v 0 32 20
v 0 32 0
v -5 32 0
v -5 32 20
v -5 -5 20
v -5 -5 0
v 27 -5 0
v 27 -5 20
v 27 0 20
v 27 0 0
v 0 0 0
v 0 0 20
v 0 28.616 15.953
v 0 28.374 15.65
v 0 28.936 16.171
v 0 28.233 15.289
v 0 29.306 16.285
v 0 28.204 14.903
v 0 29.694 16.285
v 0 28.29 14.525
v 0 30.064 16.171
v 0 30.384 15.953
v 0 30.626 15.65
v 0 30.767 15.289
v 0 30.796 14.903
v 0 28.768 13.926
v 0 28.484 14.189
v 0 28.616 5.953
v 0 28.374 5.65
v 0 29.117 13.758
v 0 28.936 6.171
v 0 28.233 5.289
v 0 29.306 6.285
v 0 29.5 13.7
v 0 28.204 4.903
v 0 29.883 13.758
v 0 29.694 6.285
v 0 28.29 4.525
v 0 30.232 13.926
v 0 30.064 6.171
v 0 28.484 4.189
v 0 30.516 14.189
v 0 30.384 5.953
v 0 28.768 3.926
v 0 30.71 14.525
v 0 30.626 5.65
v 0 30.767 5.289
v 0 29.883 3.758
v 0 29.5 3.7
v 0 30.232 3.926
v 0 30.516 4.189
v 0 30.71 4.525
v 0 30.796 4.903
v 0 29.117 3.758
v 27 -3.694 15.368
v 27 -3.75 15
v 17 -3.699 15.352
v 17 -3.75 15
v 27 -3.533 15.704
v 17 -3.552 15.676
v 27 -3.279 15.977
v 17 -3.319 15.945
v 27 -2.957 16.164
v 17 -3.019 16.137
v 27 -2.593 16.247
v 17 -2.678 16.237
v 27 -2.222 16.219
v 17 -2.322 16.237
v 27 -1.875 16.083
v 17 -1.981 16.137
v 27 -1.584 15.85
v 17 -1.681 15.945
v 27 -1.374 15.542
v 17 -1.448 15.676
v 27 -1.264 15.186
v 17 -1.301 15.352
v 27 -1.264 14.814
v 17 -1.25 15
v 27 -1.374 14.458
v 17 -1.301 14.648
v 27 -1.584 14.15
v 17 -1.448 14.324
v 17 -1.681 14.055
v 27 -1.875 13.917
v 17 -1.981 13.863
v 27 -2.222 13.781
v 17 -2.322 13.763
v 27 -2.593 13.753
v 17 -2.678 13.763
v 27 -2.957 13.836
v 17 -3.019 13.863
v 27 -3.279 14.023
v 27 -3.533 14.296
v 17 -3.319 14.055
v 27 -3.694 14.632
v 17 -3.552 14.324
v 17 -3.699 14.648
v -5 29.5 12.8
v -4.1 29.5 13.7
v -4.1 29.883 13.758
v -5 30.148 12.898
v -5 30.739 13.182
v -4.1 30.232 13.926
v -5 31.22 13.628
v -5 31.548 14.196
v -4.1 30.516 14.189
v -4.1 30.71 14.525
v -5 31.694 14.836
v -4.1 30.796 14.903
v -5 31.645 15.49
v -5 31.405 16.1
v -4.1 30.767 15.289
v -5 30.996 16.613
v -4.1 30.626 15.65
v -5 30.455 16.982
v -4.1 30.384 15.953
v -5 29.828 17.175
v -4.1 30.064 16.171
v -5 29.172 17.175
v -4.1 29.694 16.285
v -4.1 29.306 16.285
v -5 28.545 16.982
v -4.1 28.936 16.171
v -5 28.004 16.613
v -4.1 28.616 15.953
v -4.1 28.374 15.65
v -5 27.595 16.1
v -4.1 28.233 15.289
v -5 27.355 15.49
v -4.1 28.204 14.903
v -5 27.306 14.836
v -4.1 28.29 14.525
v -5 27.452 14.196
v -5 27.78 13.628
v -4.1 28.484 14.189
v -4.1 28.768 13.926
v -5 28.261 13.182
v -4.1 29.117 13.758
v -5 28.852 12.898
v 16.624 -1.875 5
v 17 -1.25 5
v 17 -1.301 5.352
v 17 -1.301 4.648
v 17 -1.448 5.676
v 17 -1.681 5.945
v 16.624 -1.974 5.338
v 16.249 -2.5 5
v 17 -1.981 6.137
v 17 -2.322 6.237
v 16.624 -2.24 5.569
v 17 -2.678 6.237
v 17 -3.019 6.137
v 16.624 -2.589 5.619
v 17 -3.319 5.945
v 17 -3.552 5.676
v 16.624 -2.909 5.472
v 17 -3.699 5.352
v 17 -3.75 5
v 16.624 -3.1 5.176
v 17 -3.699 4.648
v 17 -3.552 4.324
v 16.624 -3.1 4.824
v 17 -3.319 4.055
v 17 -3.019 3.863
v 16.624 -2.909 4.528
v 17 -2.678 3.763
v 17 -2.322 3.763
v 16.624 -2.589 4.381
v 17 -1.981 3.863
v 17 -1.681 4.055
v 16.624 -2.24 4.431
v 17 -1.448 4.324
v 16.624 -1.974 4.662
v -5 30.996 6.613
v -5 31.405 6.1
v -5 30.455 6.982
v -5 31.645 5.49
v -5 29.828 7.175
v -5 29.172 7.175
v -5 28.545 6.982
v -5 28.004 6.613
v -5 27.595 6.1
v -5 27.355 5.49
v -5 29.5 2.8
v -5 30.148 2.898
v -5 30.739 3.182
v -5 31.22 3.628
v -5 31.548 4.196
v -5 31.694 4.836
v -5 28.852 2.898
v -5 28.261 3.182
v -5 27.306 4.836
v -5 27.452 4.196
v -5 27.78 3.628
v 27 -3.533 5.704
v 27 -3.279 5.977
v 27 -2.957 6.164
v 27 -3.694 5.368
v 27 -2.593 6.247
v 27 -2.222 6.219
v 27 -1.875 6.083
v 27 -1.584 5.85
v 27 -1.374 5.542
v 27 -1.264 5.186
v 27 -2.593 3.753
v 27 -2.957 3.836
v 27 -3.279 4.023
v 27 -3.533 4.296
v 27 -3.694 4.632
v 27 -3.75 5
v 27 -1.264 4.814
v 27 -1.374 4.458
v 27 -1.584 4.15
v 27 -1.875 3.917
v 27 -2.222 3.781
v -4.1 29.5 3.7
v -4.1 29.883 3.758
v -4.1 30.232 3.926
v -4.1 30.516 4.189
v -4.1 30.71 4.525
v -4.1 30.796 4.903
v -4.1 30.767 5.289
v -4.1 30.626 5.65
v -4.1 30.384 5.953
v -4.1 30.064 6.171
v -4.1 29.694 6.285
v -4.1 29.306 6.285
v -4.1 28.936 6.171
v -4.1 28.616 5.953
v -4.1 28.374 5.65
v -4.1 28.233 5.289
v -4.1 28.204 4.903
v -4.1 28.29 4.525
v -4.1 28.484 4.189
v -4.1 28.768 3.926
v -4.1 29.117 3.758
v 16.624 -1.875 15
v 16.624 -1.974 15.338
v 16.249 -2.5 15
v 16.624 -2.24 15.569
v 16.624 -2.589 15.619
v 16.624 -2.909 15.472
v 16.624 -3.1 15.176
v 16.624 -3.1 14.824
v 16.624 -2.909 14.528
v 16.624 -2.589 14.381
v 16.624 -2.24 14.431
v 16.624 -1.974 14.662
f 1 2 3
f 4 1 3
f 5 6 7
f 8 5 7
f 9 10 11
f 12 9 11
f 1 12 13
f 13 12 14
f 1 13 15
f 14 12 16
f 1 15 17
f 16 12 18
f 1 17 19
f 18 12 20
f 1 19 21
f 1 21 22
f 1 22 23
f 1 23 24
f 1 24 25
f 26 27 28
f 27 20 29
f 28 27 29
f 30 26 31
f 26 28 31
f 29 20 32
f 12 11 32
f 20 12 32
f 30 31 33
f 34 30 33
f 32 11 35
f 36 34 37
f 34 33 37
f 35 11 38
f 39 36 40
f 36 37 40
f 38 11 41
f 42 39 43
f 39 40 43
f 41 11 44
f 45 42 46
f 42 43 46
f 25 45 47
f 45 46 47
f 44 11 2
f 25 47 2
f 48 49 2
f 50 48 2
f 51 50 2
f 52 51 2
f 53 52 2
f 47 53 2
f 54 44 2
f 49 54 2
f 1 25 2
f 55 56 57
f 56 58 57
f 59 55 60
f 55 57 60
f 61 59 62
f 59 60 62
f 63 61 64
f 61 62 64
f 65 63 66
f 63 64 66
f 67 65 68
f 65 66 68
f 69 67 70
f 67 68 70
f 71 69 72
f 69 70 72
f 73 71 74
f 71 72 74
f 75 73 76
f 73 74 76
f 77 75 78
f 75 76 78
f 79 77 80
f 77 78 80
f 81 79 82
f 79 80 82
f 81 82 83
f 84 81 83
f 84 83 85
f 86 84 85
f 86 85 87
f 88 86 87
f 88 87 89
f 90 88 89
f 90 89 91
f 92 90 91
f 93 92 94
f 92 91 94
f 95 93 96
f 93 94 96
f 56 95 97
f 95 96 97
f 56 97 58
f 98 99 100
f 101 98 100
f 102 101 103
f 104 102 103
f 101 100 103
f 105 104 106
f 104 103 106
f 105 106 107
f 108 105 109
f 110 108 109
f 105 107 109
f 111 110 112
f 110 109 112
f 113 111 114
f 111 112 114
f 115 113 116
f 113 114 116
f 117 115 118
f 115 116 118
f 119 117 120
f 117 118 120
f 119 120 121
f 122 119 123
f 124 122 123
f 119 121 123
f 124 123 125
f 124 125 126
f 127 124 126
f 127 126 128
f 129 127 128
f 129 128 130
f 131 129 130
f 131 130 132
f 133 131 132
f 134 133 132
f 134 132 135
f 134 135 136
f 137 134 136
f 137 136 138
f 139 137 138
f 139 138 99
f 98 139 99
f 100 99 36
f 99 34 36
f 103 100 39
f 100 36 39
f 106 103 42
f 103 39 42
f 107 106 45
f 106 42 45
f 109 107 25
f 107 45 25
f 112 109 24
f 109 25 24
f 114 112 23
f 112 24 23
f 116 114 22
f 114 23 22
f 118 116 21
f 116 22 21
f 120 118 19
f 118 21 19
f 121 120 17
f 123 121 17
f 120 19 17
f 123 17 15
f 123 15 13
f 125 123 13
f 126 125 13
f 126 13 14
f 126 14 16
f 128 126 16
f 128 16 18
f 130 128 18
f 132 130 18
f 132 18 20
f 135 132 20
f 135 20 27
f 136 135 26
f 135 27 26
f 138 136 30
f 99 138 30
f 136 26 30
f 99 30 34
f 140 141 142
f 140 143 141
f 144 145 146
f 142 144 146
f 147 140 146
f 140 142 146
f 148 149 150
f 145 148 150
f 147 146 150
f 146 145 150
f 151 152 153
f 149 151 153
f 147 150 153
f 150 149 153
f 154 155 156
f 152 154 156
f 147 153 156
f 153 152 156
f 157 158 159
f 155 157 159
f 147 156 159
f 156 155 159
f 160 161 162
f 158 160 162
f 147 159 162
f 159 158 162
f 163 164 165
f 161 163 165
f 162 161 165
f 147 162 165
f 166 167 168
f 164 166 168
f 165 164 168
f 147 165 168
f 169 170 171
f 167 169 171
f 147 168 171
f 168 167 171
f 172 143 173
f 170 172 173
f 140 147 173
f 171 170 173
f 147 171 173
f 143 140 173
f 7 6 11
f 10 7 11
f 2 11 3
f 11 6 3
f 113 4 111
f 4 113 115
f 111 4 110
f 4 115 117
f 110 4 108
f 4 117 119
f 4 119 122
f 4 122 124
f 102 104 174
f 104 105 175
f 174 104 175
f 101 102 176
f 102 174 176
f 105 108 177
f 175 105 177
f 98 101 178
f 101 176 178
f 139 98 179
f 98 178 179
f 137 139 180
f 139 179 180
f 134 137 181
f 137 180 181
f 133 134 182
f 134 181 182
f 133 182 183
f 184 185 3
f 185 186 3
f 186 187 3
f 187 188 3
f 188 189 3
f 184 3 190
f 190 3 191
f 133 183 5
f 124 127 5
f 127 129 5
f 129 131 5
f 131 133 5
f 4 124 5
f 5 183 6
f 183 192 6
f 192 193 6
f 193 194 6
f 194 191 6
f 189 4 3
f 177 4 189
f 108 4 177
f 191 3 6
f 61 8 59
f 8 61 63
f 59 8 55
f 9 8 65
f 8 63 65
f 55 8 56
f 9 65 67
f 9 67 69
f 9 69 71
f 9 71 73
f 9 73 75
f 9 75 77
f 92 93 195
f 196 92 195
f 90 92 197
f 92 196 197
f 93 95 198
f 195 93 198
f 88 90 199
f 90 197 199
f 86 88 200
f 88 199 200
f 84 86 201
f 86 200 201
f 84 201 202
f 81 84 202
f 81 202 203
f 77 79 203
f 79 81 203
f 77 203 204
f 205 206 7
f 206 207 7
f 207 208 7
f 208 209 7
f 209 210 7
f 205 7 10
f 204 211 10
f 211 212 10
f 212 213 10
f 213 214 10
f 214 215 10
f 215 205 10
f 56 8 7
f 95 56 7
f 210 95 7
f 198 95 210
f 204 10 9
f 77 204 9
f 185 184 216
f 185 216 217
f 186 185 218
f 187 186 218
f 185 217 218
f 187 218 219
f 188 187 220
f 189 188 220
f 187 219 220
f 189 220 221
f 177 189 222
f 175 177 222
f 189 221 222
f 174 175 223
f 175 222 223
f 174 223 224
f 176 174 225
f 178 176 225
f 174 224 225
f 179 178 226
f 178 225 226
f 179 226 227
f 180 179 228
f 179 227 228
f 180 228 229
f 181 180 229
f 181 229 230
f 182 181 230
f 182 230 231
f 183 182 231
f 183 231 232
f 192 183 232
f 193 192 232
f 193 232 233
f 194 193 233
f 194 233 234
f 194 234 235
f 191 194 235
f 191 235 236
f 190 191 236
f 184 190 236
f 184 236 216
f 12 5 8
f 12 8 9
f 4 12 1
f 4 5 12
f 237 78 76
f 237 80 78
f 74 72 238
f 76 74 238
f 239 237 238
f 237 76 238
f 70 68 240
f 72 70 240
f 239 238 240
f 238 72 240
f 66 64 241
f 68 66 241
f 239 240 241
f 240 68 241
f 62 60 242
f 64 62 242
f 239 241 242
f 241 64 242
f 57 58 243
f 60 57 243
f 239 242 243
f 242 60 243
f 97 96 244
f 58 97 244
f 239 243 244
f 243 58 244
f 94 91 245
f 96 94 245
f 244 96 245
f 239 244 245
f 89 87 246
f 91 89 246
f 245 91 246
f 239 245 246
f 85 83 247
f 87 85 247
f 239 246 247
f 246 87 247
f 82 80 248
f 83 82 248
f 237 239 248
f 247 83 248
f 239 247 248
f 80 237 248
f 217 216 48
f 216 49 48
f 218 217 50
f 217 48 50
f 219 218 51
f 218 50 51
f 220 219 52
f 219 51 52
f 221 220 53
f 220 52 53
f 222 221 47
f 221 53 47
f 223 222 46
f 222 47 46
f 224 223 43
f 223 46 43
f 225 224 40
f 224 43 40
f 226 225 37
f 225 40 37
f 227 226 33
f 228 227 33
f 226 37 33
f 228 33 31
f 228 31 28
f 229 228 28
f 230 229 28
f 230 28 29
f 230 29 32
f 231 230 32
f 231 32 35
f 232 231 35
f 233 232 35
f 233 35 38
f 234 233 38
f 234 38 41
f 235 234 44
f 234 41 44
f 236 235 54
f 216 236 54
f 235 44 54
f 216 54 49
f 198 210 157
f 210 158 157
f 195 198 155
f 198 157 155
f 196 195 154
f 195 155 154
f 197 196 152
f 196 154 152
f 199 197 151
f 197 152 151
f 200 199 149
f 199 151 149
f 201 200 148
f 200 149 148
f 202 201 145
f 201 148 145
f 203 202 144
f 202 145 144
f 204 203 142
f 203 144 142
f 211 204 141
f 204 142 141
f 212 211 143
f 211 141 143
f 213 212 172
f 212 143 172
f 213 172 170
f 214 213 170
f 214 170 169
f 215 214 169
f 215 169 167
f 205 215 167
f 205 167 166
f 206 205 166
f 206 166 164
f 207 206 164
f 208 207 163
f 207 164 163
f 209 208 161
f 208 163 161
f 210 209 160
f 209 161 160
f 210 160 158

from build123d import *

# Parameters (mm, degrees)
BOSS_EXTRUDE_EQUERRE_DEPTH                     = 20
FRAISAGE_POUR_VIS_T_TE_FRAIS_E_M21_D           = 2.6
FRAISAGE_POUR_VIS_T_TE_FRAIS_E_M21_CSINK_D     = 4.4
FRAISAGE_POUR_VIS_T_TE_FRAIS_E_M21_CSINK_ANGLE = 90
TROU_TARAUD_M3X0_51_D                          = 2.5
TROU_TARAUD_M3X0_51_DEPTH                      = 10
TROU_TARAUD_M3X0_51_TIP                        = 0.751075774


with BuildPart() as part:
    # Esquisse1 → Boss_Extrude_Equerre (new body)
    with BuildSketch(Plane(origin=(0, 0, 0), x_dir=(0, 1, 0), z_dir=(0, 0, 1))):
        Polygon((0, 0), (32, 0), (32, 5), (-5, 5), (-5, 0), (-5, -27), (0, -27), align=None)
    extrude(amount=BOSS_EXTRUDE_EQUERRE_DEPTH)

    # Fraisage pour vis à tête fraisée M21 (through all)
    with Locations(Plane.ZY.offset(5)):
        with Locations((15, 29.5), (5, 29.5)):
            CounterSinkHole(FRAISAGE_POUR_VIS_T_TE_FRAIS_E_M21_D / 2, FRAISAGE_POUR_VIS_T_TE_FRAIS_E_M21_CSINK_D / 2, counter_sink_angle=FRAISAGE_POUR_VIS_T_TE_FRAIS_E_M21_CSINK_ANGLE)

    # Trou taraudé M3x0.51
    with Locations(Plane.YZ.offset(27)):
        with Locations((-2.5, 15), (-2.5, 5)):
            Hole(TROU_TARAUD_M3X0_51_D / 2, depth=TROU_TARAUD_M3X0_51_DEPTH)
            with Locations((0, 0, -(TROU_TARAUD_M3X0_51_DEPTH + TROU_TARAUD_M3X0_51_TIP / 2))):  # 118° drill point
                Cone(0, TROU_TARAUD_M3X0_51_D / 2, TROU_TARAUD_M3X0_51_TIP, mode=Mode.SUBTRACT)


solid = part.part
